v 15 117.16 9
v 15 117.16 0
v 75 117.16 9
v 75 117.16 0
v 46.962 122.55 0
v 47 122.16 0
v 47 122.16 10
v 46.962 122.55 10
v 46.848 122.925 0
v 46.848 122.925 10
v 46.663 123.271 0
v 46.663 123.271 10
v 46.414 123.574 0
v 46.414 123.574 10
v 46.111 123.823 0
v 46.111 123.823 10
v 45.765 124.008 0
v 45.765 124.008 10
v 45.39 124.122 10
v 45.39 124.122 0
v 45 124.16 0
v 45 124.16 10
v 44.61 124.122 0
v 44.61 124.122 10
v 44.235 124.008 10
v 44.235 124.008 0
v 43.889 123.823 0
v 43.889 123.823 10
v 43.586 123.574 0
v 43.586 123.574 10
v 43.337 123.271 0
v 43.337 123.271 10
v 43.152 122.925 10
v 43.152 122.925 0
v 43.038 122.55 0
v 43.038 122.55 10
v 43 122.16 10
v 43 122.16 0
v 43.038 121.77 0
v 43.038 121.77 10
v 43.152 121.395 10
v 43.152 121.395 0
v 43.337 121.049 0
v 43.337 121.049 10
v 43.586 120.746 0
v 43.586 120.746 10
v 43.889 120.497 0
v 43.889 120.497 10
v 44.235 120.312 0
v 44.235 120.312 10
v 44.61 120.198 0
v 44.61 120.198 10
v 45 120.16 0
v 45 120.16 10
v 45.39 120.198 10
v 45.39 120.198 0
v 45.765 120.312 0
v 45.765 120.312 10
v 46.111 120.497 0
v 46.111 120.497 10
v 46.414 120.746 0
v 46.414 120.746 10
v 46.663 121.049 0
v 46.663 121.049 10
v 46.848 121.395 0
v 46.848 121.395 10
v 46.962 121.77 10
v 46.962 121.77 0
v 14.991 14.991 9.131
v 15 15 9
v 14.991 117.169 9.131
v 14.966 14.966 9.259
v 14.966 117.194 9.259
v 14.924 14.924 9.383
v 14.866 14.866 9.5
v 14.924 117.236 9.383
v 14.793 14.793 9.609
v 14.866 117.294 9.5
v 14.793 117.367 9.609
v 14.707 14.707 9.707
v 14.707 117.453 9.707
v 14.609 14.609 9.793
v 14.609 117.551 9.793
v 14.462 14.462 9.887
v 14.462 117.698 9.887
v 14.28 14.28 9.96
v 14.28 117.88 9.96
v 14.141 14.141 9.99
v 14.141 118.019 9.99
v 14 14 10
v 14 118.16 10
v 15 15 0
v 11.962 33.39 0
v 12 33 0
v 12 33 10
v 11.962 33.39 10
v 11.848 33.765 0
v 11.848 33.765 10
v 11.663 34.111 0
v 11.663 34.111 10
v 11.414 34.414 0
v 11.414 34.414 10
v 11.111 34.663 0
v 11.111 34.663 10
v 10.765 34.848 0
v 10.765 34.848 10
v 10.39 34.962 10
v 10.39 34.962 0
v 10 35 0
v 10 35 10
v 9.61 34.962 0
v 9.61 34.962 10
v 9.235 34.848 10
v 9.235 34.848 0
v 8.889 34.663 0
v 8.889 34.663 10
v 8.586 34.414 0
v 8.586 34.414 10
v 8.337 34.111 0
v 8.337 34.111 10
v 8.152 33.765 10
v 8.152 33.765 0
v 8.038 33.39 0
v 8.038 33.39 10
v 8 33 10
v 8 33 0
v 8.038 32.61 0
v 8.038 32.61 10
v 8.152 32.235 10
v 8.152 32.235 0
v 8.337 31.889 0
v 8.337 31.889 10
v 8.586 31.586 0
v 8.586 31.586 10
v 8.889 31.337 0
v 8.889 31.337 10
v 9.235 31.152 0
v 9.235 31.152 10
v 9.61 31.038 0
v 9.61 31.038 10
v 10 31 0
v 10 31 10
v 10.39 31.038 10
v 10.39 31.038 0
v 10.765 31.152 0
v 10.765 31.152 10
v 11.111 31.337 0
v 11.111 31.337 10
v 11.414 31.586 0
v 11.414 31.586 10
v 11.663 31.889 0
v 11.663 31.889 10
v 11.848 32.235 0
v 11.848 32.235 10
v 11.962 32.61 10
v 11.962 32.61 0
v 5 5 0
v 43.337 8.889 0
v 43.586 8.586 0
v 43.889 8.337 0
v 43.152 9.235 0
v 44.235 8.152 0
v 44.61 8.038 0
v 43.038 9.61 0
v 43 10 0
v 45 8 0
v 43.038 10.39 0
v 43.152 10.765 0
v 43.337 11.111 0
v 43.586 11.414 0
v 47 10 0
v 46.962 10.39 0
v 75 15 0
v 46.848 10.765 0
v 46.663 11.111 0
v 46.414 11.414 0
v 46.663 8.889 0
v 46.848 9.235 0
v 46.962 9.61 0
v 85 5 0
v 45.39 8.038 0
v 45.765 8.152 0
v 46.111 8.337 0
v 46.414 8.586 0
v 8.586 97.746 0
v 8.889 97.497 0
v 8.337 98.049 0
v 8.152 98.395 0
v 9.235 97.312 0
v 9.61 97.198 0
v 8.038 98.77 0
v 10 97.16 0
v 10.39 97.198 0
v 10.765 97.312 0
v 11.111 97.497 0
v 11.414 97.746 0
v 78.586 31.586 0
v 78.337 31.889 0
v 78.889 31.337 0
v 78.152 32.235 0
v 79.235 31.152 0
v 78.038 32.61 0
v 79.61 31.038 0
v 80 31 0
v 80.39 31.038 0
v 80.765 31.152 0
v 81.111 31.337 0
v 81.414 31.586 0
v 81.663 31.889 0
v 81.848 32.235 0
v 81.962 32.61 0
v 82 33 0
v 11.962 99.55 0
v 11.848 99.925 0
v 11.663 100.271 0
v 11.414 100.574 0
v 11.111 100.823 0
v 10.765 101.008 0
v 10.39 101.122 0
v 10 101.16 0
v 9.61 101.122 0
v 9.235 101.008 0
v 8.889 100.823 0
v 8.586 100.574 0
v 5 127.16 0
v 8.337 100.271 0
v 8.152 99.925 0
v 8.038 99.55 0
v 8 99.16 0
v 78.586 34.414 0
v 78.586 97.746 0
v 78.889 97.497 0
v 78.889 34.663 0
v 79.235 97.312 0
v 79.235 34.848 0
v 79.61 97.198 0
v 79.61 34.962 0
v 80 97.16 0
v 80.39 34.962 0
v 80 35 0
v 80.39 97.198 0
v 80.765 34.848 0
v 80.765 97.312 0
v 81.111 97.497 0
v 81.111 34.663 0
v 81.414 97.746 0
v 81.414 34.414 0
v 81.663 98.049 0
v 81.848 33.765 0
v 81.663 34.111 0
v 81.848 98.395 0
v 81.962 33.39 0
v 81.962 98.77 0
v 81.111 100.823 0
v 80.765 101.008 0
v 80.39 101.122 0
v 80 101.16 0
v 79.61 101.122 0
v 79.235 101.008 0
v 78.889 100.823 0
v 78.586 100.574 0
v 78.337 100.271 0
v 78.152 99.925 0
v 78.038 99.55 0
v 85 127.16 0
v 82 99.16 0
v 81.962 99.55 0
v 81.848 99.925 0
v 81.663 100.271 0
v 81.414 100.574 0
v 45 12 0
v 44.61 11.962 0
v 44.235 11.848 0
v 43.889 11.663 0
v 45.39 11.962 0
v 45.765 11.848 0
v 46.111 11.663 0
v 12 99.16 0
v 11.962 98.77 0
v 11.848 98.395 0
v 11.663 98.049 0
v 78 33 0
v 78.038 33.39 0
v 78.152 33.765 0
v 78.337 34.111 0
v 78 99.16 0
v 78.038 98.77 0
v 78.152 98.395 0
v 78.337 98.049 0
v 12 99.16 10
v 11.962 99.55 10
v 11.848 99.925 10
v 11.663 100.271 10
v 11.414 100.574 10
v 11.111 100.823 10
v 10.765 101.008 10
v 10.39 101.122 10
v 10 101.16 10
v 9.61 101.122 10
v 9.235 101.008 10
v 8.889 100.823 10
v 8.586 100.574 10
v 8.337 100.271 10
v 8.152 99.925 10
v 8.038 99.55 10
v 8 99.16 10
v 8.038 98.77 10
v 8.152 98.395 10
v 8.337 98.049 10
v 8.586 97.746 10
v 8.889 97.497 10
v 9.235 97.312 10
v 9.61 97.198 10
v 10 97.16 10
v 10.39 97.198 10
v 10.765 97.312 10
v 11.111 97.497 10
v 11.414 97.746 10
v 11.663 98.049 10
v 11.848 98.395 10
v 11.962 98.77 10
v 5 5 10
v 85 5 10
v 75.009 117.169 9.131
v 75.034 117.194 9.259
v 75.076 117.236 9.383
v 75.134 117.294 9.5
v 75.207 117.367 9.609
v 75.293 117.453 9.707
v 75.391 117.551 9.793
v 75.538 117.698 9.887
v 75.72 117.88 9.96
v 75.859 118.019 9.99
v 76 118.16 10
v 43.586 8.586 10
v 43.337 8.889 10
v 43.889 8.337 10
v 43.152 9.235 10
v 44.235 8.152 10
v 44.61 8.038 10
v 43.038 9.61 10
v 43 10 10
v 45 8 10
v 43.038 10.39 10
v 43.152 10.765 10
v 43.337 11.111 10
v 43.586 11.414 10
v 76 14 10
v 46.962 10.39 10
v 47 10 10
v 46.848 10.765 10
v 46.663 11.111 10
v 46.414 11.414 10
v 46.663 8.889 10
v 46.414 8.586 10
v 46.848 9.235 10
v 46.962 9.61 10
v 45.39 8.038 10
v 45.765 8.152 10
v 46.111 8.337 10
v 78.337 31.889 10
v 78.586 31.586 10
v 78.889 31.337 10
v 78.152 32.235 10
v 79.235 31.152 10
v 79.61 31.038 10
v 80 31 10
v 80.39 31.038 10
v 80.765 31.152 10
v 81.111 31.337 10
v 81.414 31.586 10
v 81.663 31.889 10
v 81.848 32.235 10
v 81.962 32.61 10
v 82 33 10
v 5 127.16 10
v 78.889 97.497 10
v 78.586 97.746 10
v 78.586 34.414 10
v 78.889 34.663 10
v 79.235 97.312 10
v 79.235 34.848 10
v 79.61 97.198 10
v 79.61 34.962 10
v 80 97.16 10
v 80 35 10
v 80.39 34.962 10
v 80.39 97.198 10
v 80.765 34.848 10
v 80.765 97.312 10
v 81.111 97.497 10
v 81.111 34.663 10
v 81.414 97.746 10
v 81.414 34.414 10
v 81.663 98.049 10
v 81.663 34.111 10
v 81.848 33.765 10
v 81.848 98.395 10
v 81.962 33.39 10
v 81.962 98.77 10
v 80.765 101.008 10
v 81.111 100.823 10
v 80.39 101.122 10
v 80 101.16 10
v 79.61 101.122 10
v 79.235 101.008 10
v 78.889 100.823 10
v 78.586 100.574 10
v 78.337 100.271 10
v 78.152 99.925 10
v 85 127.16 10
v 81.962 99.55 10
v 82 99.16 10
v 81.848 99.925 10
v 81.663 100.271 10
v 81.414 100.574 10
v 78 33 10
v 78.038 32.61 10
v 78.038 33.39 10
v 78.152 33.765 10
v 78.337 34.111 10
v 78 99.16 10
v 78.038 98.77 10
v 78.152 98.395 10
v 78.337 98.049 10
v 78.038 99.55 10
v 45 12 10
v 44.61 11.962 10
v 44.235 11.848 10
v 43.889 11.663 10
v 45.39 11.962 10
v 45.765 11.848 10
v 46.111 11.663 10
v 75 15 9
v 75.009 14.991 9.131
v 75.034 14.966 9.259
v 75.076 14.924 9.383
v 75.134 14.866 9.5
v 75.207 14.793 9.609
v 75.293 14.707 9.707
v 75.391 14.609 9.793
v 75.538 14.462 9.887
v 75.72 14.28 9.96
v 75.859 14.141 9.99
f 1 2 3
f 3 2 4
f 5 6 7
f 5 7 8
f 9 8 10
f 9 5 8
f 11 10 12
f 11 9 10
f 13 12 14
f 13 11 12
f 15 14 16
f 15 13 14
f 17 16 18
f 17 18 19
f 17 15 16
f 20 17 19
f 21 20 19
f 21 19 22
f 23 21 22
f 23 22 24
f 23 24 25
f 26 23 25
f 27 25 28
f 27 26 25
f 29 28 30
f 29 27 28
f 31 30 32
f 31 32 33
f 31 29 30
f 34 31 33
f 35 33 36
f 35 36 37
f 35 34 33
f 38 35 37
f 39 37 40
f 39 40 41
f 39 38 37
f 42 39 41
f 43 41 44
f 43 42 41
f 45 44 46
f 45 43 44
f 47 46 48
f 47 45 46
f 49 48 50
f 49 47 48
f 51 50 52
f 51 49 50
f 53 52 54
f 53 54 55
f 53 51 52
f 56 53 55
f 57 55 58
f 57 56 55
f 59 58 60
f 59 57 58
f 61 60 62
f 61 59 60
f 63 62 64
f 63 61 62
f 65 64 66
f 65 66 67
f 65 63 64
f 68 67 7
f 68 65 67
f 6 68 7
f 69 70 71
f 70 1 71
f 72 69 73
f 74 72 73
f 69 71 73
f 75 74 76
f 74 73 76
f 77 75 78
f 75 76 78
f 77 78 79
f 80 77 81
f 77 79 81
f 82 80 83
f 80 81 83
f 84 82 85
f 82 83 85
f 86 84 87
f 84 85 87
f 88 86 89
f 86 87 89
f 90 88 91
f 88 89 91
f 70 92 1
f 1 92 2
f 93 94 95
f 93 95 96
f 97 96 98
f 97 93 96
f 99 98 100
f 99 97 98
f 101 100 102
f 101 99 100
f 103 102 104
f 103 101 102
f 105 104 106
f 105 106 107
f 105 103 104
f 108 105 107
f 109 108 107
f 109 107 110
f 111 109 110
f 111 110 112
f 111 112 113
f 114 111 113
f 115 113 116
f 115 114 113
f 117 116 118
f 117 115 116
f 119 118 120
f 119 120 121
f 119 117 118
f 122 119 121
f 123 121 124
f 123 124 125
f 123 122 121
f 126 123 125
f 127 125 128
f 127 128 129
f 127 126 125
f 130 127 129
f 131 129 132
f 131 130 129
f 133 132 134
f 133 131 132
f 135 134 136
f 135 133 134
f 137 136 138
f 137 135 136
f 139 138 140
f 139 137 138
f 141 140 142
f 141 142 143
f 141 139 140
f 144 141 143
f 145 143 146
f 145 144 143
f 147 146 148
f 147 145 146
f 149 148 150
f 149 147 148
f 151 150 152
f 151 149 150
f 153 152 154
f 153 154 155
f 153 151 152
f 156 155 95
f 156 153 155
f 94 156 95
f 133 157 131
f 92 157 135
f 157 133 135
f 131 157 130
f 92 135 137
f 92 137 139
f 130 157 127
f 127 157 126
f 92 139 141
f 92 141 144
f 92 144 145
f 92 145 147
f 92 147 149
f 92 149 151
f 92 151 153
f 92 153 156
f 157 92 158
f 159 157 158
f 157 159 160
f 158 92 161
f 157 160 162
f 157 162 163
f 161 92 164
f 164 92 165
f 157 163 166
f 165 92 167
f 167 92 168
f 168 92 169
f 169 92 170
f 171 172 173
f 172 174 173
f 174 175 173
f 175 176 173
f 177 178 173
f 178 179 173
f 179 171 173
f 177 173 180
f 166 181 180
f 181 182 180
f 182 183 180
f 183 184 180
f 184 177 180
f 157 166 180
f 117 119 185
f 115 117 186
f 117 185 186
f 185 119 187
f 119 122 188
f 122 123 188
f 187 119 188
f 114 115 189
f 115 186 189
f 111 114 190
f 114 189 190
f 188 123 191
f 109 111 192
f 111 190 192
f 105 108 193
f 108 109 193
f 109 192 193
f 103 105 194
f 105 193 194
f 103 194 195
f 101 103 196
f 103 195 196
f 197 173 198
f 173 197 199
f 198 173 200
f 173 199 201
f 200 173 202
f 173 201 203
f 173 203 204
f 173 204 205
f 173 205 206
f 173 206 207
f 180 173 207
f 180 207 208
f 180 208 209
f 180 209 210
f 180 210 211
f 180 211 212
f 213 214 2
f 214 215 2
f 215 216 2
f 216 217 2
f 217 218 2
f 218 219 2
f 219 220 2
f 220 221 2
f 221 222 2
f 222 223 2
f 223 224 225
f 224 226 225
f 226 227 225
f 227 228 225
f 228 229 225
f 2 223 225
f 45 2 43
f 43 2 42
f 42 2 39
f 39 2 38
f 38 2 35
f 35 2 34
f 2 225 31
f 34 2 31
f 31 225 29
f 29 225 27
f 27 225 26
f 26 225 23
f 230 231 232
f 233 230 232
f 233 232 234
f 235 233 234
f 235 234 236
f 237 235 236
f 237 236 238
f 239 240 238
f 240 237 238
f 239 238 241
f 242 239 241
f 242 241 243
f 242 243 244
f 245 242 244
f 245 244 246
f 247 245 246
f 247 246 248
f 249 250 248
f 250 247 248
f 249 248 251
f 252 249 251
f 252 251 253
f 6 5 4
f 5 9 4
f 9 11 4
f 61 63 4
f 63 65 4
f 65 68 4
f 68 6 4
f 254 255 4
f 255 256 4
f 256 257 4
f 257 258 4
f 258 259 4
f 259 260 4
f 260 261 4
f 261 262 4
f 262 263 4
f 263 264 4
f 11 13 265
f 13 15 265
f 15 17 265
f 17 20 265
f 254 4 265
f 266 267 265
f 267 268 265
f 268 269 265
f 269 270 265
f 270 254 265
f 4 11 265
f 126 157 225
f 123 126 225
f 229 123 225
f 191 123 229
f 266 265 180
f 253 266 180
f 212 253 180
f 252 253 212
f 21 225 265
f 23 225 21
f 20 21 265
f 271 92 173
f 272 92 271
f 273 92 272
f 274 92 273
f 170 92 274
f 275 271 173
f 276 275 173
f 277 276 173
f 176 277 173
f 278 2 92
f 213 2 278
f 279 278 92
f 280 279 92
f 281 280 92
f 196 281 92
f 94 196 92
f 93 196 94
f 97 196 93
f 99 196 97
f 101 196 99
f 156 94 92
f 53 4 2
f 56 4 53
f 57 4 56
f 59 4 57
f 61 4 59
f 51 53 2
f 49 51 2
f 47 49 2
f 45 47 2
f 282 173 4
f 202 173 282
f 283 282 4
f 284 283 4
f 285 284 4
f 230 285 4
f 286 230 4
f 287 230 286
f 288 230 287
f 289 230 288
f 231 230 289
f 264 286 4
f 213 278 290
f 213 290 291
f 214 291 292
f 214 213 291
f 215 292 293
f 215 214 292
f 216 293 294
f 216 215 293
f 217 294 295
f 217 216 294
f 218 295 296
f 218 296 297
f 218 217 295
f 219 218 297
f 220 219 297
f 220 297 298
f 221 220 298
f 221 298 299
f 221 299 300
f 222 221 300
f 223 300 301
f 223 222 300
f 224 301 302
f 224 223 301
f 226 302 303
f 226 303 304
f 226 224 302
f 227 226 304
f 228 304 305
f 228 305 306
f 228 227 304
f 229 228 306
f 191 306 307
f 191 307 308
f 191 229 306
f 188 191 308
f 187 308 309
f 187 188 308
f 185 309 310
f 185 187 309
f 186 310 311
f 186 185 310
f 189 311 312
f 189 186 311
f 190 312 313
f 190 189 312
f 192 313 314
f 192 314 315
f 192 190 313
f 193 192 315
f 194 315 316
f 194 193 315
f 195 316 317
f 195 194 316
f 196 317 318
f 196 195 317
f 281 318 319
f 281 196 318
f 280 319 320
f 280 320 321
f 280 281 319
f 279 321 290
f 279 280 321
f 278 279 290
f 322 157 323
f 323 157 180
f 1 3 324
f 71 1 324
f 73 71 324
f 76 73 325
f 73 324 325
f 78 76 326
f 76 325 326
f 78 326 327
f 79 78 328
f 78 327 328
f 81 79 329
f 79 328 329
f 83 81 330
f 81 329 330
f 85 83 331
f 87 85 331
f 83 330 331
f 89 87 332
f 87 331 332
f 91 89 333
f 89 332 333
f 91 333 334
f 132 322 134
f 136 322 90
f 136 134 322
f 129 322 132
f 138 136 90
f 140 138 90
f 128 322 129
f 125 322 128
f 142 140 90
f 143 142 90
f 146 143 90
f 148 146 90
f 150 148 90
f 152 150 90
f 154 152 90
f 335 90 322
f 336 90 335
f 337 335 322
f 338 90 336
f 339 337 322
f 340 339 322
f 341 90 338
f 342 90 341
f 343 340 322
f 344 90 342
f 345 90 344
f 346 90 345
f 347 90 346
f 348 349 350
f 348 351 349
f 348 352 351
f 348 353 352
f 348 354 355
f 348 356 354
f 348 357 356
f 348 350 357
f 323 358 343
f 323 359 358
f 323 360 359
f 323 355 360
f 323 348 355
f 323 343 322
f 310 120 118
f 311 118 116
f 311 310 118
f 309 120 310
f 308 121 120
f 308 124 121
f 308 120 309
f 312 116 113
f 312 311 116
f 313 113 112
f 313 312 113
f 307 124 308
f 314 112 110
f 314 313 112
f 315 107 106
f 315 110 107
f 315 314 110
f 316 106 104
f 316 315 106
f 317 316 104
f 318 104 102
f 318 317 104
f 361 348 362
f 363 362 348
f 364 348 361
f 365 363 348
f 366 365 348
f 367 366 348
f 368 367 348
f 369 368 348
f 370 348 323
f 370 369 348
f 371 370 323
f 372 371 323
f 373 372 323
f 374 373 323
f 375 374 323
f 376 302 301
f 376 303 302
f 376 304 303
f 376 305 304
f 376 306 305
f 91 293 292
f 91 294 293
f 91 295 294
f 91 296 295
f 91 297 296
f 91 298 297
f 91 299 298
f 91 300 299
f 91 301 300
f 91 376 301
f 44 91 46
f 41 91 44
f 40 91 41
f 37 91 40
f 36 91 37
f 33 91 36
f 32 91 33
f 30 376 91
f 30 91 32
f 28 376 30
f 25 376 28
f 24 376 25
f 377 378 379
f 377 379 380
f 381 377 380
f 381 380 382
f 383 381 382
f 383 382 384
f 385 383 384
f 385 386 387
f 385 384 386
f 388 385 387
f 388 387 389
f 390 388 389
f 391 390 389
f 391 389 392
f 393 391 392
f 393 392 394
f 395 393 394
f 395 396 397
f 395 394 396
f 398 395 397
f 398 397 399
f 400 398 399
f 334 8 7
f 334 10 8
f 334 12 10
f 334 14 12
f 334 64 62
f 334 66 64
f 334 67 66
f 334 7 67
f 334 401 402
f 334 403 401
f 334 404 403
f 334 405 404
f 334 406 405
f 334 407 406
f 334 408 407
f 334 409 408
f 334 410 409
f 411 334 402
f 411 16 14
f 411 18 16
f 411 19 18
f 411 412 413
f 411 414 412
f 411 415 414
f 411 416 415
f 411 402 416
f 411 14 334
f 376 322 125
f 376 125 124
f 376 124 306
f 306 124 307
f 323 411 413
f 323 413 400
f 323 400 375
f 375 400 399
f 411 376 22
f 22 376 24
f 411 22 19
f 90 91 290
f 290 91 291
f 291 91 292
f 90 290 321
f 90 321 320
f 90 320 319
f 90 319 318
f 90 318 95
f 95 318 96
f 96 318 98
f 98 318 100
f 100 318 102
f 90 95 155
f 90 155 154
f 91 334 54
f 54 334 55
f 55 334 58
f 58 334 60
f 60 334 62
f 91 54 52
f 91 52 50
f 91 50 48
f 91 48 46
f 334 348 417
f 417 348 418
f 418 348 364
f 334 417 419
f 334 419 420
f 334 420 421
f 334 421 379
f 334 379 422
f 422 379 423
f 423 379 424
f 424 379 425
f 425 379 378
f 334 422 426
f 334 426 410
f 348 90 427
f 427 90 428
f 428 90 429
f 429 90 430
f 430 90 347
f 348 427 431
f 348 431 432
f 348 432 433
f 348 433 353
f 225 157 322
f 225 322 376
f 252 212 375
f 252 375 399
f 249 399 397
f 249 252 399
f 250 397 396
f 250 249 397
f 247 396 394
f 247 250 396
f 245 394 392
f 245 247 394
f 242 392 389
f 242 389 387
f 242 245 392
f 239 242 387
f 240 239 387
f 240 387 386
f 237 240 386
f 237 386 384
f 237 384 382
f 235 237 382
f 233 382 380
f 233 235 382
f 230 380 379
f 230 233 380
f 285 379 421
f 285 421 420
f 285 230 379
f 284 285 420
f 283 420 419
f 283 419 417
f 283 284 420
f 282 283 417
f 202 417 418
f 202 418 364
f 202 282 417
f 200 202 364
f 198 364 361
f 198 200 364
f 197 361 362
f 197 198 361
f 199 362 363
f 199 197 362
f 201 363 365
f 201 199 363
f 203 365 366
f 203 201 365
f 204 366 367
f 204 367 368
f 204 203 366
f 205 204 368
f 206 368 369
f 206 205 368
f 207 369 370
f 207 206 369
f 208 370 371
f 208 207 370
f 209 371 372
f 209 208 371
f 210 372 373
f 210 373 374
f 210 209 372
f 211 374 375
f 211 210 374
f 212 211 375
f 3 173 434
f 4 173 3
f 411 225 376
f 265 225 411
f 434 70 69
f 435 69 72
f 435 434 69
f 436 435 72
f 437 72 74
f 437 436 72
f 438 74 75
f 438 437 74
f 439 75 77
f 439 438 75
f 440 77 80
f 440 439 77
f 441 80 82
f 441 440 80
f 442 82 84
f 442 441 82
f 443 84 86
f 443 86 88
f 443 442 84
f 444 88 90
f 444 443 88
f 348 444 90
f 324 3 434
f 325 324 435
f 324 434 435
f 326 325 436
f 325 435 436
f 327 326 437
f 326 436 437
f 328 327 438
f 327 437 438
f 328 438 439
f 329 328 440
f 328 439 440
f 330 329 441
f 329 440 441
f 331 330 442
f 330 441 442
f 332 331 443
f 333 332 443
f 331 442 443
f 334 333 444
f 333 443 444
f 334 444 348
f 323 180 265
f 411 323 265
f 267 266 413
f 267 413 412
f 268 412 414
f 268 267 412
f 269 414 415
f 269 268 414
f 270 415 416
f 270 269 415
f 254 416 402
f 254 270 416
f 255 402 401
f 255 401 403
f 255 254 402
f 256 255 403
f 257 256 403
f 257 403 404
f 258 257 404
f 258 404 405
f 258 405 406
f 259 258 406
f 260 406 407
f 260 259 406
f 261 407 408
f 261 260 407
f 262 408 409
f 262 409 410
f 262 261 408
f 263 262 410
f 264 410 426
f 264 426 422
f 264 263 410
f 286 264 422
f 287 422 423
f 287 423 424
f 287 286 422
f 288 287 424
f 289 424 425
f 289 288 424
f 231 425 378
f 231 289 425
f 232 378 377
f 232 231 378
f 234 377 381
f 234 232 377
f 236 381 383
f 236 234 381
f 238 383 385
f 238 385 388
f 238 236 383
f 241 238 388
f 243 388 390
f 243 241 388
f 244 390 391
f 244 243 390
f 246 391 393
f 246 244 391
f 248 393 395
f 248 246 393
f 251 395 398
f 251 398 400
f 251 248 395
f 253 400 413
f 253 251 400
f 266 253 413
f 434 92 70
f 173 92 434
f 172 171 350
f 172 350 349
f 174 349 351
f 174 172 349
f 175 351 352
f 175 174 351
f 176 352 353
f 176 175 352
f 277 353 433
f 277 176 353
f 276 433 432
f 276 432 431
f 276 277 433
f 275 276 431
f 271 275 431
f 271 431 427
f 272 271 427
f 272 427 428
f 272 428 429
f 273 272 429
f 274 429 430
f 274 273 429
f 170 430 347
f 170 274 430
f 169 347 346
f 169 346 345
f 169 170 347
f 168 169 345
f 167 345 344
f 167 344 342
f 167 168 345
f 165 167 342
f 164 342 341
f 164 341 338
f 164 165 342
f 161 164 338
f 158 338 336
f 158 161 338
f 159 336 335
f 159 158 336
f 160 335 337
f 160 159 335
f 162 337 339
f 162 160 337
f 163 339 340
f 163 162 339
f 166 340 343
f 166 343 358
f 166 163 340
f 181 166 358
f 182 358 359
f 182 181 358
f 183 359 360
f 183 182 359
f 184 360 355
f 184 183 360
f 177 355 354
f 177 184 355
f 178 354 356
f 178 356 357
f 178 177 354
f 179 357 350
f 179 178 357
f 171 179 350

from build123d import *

# Parameters (mm, degrees)
SKETCH_W    = 80
SKETCH_H    = 122.16
SKETCH_R    = 2
SKETCH_W_2  = 60
SKETCH_H_2  = 102.16
PAD_DEPTH   = 10
FILLET_R    = 1
FILLET001_R = 1


with BuildPart() as part:
    # Sketch → Pad (new body)
    with BuildSketch(Plane.XY):
        with Locations((45, 66.08)):
            Rectangle(SKETCH_W, SKETCH_H)
        with Locations((10, 99.16)):
            Circle(SKETCH_R, mode=Mode.SUBTRACT)
        with Locations((10, 33)):
            Circle(SKETCH_R, mode=Mode.SUBTRACT)
        with Locations((80, 99.16)):
            Circle(SKETCH_R, mode=Mode.SUBTRACT)
        with Locations((80, 33)):
            Circle(SKETCH_R, mode=Mode.SUBTRACT)
        with Locations((45, 122.16)):
            Circle(SKETCH_R, mode=Mode.SUBTRACT)
        with Locations((45, 10)):
            Circle(SKETCH_R, mode=Mode.SUBTRACT)
        with Locations((45, 66.08)):
            Rectangle(SKETCH_W_2, SKETCH_H_2, mode=Mode.SUBTRACT)
    extrude(amount=PAD_DEPTH)

    # Fillet
    fillet_edges = [part.edges().sort_by_distance(p)[0] for p in [
        (45, 117.16, 10),
        (15, 66.08, 10),
    ]]
    fillet(fillet_edges, radius=FILLET_R)

    # Fillet001
    fillet001_edges = [part.edges().sort_by_distance(p)[0] for p in [
        (45, 15, 10),
        (75, 66.08, 10),
    ]]
    fillet(fillet001_edges, radius=FILLET001_R)


solid = part.part
